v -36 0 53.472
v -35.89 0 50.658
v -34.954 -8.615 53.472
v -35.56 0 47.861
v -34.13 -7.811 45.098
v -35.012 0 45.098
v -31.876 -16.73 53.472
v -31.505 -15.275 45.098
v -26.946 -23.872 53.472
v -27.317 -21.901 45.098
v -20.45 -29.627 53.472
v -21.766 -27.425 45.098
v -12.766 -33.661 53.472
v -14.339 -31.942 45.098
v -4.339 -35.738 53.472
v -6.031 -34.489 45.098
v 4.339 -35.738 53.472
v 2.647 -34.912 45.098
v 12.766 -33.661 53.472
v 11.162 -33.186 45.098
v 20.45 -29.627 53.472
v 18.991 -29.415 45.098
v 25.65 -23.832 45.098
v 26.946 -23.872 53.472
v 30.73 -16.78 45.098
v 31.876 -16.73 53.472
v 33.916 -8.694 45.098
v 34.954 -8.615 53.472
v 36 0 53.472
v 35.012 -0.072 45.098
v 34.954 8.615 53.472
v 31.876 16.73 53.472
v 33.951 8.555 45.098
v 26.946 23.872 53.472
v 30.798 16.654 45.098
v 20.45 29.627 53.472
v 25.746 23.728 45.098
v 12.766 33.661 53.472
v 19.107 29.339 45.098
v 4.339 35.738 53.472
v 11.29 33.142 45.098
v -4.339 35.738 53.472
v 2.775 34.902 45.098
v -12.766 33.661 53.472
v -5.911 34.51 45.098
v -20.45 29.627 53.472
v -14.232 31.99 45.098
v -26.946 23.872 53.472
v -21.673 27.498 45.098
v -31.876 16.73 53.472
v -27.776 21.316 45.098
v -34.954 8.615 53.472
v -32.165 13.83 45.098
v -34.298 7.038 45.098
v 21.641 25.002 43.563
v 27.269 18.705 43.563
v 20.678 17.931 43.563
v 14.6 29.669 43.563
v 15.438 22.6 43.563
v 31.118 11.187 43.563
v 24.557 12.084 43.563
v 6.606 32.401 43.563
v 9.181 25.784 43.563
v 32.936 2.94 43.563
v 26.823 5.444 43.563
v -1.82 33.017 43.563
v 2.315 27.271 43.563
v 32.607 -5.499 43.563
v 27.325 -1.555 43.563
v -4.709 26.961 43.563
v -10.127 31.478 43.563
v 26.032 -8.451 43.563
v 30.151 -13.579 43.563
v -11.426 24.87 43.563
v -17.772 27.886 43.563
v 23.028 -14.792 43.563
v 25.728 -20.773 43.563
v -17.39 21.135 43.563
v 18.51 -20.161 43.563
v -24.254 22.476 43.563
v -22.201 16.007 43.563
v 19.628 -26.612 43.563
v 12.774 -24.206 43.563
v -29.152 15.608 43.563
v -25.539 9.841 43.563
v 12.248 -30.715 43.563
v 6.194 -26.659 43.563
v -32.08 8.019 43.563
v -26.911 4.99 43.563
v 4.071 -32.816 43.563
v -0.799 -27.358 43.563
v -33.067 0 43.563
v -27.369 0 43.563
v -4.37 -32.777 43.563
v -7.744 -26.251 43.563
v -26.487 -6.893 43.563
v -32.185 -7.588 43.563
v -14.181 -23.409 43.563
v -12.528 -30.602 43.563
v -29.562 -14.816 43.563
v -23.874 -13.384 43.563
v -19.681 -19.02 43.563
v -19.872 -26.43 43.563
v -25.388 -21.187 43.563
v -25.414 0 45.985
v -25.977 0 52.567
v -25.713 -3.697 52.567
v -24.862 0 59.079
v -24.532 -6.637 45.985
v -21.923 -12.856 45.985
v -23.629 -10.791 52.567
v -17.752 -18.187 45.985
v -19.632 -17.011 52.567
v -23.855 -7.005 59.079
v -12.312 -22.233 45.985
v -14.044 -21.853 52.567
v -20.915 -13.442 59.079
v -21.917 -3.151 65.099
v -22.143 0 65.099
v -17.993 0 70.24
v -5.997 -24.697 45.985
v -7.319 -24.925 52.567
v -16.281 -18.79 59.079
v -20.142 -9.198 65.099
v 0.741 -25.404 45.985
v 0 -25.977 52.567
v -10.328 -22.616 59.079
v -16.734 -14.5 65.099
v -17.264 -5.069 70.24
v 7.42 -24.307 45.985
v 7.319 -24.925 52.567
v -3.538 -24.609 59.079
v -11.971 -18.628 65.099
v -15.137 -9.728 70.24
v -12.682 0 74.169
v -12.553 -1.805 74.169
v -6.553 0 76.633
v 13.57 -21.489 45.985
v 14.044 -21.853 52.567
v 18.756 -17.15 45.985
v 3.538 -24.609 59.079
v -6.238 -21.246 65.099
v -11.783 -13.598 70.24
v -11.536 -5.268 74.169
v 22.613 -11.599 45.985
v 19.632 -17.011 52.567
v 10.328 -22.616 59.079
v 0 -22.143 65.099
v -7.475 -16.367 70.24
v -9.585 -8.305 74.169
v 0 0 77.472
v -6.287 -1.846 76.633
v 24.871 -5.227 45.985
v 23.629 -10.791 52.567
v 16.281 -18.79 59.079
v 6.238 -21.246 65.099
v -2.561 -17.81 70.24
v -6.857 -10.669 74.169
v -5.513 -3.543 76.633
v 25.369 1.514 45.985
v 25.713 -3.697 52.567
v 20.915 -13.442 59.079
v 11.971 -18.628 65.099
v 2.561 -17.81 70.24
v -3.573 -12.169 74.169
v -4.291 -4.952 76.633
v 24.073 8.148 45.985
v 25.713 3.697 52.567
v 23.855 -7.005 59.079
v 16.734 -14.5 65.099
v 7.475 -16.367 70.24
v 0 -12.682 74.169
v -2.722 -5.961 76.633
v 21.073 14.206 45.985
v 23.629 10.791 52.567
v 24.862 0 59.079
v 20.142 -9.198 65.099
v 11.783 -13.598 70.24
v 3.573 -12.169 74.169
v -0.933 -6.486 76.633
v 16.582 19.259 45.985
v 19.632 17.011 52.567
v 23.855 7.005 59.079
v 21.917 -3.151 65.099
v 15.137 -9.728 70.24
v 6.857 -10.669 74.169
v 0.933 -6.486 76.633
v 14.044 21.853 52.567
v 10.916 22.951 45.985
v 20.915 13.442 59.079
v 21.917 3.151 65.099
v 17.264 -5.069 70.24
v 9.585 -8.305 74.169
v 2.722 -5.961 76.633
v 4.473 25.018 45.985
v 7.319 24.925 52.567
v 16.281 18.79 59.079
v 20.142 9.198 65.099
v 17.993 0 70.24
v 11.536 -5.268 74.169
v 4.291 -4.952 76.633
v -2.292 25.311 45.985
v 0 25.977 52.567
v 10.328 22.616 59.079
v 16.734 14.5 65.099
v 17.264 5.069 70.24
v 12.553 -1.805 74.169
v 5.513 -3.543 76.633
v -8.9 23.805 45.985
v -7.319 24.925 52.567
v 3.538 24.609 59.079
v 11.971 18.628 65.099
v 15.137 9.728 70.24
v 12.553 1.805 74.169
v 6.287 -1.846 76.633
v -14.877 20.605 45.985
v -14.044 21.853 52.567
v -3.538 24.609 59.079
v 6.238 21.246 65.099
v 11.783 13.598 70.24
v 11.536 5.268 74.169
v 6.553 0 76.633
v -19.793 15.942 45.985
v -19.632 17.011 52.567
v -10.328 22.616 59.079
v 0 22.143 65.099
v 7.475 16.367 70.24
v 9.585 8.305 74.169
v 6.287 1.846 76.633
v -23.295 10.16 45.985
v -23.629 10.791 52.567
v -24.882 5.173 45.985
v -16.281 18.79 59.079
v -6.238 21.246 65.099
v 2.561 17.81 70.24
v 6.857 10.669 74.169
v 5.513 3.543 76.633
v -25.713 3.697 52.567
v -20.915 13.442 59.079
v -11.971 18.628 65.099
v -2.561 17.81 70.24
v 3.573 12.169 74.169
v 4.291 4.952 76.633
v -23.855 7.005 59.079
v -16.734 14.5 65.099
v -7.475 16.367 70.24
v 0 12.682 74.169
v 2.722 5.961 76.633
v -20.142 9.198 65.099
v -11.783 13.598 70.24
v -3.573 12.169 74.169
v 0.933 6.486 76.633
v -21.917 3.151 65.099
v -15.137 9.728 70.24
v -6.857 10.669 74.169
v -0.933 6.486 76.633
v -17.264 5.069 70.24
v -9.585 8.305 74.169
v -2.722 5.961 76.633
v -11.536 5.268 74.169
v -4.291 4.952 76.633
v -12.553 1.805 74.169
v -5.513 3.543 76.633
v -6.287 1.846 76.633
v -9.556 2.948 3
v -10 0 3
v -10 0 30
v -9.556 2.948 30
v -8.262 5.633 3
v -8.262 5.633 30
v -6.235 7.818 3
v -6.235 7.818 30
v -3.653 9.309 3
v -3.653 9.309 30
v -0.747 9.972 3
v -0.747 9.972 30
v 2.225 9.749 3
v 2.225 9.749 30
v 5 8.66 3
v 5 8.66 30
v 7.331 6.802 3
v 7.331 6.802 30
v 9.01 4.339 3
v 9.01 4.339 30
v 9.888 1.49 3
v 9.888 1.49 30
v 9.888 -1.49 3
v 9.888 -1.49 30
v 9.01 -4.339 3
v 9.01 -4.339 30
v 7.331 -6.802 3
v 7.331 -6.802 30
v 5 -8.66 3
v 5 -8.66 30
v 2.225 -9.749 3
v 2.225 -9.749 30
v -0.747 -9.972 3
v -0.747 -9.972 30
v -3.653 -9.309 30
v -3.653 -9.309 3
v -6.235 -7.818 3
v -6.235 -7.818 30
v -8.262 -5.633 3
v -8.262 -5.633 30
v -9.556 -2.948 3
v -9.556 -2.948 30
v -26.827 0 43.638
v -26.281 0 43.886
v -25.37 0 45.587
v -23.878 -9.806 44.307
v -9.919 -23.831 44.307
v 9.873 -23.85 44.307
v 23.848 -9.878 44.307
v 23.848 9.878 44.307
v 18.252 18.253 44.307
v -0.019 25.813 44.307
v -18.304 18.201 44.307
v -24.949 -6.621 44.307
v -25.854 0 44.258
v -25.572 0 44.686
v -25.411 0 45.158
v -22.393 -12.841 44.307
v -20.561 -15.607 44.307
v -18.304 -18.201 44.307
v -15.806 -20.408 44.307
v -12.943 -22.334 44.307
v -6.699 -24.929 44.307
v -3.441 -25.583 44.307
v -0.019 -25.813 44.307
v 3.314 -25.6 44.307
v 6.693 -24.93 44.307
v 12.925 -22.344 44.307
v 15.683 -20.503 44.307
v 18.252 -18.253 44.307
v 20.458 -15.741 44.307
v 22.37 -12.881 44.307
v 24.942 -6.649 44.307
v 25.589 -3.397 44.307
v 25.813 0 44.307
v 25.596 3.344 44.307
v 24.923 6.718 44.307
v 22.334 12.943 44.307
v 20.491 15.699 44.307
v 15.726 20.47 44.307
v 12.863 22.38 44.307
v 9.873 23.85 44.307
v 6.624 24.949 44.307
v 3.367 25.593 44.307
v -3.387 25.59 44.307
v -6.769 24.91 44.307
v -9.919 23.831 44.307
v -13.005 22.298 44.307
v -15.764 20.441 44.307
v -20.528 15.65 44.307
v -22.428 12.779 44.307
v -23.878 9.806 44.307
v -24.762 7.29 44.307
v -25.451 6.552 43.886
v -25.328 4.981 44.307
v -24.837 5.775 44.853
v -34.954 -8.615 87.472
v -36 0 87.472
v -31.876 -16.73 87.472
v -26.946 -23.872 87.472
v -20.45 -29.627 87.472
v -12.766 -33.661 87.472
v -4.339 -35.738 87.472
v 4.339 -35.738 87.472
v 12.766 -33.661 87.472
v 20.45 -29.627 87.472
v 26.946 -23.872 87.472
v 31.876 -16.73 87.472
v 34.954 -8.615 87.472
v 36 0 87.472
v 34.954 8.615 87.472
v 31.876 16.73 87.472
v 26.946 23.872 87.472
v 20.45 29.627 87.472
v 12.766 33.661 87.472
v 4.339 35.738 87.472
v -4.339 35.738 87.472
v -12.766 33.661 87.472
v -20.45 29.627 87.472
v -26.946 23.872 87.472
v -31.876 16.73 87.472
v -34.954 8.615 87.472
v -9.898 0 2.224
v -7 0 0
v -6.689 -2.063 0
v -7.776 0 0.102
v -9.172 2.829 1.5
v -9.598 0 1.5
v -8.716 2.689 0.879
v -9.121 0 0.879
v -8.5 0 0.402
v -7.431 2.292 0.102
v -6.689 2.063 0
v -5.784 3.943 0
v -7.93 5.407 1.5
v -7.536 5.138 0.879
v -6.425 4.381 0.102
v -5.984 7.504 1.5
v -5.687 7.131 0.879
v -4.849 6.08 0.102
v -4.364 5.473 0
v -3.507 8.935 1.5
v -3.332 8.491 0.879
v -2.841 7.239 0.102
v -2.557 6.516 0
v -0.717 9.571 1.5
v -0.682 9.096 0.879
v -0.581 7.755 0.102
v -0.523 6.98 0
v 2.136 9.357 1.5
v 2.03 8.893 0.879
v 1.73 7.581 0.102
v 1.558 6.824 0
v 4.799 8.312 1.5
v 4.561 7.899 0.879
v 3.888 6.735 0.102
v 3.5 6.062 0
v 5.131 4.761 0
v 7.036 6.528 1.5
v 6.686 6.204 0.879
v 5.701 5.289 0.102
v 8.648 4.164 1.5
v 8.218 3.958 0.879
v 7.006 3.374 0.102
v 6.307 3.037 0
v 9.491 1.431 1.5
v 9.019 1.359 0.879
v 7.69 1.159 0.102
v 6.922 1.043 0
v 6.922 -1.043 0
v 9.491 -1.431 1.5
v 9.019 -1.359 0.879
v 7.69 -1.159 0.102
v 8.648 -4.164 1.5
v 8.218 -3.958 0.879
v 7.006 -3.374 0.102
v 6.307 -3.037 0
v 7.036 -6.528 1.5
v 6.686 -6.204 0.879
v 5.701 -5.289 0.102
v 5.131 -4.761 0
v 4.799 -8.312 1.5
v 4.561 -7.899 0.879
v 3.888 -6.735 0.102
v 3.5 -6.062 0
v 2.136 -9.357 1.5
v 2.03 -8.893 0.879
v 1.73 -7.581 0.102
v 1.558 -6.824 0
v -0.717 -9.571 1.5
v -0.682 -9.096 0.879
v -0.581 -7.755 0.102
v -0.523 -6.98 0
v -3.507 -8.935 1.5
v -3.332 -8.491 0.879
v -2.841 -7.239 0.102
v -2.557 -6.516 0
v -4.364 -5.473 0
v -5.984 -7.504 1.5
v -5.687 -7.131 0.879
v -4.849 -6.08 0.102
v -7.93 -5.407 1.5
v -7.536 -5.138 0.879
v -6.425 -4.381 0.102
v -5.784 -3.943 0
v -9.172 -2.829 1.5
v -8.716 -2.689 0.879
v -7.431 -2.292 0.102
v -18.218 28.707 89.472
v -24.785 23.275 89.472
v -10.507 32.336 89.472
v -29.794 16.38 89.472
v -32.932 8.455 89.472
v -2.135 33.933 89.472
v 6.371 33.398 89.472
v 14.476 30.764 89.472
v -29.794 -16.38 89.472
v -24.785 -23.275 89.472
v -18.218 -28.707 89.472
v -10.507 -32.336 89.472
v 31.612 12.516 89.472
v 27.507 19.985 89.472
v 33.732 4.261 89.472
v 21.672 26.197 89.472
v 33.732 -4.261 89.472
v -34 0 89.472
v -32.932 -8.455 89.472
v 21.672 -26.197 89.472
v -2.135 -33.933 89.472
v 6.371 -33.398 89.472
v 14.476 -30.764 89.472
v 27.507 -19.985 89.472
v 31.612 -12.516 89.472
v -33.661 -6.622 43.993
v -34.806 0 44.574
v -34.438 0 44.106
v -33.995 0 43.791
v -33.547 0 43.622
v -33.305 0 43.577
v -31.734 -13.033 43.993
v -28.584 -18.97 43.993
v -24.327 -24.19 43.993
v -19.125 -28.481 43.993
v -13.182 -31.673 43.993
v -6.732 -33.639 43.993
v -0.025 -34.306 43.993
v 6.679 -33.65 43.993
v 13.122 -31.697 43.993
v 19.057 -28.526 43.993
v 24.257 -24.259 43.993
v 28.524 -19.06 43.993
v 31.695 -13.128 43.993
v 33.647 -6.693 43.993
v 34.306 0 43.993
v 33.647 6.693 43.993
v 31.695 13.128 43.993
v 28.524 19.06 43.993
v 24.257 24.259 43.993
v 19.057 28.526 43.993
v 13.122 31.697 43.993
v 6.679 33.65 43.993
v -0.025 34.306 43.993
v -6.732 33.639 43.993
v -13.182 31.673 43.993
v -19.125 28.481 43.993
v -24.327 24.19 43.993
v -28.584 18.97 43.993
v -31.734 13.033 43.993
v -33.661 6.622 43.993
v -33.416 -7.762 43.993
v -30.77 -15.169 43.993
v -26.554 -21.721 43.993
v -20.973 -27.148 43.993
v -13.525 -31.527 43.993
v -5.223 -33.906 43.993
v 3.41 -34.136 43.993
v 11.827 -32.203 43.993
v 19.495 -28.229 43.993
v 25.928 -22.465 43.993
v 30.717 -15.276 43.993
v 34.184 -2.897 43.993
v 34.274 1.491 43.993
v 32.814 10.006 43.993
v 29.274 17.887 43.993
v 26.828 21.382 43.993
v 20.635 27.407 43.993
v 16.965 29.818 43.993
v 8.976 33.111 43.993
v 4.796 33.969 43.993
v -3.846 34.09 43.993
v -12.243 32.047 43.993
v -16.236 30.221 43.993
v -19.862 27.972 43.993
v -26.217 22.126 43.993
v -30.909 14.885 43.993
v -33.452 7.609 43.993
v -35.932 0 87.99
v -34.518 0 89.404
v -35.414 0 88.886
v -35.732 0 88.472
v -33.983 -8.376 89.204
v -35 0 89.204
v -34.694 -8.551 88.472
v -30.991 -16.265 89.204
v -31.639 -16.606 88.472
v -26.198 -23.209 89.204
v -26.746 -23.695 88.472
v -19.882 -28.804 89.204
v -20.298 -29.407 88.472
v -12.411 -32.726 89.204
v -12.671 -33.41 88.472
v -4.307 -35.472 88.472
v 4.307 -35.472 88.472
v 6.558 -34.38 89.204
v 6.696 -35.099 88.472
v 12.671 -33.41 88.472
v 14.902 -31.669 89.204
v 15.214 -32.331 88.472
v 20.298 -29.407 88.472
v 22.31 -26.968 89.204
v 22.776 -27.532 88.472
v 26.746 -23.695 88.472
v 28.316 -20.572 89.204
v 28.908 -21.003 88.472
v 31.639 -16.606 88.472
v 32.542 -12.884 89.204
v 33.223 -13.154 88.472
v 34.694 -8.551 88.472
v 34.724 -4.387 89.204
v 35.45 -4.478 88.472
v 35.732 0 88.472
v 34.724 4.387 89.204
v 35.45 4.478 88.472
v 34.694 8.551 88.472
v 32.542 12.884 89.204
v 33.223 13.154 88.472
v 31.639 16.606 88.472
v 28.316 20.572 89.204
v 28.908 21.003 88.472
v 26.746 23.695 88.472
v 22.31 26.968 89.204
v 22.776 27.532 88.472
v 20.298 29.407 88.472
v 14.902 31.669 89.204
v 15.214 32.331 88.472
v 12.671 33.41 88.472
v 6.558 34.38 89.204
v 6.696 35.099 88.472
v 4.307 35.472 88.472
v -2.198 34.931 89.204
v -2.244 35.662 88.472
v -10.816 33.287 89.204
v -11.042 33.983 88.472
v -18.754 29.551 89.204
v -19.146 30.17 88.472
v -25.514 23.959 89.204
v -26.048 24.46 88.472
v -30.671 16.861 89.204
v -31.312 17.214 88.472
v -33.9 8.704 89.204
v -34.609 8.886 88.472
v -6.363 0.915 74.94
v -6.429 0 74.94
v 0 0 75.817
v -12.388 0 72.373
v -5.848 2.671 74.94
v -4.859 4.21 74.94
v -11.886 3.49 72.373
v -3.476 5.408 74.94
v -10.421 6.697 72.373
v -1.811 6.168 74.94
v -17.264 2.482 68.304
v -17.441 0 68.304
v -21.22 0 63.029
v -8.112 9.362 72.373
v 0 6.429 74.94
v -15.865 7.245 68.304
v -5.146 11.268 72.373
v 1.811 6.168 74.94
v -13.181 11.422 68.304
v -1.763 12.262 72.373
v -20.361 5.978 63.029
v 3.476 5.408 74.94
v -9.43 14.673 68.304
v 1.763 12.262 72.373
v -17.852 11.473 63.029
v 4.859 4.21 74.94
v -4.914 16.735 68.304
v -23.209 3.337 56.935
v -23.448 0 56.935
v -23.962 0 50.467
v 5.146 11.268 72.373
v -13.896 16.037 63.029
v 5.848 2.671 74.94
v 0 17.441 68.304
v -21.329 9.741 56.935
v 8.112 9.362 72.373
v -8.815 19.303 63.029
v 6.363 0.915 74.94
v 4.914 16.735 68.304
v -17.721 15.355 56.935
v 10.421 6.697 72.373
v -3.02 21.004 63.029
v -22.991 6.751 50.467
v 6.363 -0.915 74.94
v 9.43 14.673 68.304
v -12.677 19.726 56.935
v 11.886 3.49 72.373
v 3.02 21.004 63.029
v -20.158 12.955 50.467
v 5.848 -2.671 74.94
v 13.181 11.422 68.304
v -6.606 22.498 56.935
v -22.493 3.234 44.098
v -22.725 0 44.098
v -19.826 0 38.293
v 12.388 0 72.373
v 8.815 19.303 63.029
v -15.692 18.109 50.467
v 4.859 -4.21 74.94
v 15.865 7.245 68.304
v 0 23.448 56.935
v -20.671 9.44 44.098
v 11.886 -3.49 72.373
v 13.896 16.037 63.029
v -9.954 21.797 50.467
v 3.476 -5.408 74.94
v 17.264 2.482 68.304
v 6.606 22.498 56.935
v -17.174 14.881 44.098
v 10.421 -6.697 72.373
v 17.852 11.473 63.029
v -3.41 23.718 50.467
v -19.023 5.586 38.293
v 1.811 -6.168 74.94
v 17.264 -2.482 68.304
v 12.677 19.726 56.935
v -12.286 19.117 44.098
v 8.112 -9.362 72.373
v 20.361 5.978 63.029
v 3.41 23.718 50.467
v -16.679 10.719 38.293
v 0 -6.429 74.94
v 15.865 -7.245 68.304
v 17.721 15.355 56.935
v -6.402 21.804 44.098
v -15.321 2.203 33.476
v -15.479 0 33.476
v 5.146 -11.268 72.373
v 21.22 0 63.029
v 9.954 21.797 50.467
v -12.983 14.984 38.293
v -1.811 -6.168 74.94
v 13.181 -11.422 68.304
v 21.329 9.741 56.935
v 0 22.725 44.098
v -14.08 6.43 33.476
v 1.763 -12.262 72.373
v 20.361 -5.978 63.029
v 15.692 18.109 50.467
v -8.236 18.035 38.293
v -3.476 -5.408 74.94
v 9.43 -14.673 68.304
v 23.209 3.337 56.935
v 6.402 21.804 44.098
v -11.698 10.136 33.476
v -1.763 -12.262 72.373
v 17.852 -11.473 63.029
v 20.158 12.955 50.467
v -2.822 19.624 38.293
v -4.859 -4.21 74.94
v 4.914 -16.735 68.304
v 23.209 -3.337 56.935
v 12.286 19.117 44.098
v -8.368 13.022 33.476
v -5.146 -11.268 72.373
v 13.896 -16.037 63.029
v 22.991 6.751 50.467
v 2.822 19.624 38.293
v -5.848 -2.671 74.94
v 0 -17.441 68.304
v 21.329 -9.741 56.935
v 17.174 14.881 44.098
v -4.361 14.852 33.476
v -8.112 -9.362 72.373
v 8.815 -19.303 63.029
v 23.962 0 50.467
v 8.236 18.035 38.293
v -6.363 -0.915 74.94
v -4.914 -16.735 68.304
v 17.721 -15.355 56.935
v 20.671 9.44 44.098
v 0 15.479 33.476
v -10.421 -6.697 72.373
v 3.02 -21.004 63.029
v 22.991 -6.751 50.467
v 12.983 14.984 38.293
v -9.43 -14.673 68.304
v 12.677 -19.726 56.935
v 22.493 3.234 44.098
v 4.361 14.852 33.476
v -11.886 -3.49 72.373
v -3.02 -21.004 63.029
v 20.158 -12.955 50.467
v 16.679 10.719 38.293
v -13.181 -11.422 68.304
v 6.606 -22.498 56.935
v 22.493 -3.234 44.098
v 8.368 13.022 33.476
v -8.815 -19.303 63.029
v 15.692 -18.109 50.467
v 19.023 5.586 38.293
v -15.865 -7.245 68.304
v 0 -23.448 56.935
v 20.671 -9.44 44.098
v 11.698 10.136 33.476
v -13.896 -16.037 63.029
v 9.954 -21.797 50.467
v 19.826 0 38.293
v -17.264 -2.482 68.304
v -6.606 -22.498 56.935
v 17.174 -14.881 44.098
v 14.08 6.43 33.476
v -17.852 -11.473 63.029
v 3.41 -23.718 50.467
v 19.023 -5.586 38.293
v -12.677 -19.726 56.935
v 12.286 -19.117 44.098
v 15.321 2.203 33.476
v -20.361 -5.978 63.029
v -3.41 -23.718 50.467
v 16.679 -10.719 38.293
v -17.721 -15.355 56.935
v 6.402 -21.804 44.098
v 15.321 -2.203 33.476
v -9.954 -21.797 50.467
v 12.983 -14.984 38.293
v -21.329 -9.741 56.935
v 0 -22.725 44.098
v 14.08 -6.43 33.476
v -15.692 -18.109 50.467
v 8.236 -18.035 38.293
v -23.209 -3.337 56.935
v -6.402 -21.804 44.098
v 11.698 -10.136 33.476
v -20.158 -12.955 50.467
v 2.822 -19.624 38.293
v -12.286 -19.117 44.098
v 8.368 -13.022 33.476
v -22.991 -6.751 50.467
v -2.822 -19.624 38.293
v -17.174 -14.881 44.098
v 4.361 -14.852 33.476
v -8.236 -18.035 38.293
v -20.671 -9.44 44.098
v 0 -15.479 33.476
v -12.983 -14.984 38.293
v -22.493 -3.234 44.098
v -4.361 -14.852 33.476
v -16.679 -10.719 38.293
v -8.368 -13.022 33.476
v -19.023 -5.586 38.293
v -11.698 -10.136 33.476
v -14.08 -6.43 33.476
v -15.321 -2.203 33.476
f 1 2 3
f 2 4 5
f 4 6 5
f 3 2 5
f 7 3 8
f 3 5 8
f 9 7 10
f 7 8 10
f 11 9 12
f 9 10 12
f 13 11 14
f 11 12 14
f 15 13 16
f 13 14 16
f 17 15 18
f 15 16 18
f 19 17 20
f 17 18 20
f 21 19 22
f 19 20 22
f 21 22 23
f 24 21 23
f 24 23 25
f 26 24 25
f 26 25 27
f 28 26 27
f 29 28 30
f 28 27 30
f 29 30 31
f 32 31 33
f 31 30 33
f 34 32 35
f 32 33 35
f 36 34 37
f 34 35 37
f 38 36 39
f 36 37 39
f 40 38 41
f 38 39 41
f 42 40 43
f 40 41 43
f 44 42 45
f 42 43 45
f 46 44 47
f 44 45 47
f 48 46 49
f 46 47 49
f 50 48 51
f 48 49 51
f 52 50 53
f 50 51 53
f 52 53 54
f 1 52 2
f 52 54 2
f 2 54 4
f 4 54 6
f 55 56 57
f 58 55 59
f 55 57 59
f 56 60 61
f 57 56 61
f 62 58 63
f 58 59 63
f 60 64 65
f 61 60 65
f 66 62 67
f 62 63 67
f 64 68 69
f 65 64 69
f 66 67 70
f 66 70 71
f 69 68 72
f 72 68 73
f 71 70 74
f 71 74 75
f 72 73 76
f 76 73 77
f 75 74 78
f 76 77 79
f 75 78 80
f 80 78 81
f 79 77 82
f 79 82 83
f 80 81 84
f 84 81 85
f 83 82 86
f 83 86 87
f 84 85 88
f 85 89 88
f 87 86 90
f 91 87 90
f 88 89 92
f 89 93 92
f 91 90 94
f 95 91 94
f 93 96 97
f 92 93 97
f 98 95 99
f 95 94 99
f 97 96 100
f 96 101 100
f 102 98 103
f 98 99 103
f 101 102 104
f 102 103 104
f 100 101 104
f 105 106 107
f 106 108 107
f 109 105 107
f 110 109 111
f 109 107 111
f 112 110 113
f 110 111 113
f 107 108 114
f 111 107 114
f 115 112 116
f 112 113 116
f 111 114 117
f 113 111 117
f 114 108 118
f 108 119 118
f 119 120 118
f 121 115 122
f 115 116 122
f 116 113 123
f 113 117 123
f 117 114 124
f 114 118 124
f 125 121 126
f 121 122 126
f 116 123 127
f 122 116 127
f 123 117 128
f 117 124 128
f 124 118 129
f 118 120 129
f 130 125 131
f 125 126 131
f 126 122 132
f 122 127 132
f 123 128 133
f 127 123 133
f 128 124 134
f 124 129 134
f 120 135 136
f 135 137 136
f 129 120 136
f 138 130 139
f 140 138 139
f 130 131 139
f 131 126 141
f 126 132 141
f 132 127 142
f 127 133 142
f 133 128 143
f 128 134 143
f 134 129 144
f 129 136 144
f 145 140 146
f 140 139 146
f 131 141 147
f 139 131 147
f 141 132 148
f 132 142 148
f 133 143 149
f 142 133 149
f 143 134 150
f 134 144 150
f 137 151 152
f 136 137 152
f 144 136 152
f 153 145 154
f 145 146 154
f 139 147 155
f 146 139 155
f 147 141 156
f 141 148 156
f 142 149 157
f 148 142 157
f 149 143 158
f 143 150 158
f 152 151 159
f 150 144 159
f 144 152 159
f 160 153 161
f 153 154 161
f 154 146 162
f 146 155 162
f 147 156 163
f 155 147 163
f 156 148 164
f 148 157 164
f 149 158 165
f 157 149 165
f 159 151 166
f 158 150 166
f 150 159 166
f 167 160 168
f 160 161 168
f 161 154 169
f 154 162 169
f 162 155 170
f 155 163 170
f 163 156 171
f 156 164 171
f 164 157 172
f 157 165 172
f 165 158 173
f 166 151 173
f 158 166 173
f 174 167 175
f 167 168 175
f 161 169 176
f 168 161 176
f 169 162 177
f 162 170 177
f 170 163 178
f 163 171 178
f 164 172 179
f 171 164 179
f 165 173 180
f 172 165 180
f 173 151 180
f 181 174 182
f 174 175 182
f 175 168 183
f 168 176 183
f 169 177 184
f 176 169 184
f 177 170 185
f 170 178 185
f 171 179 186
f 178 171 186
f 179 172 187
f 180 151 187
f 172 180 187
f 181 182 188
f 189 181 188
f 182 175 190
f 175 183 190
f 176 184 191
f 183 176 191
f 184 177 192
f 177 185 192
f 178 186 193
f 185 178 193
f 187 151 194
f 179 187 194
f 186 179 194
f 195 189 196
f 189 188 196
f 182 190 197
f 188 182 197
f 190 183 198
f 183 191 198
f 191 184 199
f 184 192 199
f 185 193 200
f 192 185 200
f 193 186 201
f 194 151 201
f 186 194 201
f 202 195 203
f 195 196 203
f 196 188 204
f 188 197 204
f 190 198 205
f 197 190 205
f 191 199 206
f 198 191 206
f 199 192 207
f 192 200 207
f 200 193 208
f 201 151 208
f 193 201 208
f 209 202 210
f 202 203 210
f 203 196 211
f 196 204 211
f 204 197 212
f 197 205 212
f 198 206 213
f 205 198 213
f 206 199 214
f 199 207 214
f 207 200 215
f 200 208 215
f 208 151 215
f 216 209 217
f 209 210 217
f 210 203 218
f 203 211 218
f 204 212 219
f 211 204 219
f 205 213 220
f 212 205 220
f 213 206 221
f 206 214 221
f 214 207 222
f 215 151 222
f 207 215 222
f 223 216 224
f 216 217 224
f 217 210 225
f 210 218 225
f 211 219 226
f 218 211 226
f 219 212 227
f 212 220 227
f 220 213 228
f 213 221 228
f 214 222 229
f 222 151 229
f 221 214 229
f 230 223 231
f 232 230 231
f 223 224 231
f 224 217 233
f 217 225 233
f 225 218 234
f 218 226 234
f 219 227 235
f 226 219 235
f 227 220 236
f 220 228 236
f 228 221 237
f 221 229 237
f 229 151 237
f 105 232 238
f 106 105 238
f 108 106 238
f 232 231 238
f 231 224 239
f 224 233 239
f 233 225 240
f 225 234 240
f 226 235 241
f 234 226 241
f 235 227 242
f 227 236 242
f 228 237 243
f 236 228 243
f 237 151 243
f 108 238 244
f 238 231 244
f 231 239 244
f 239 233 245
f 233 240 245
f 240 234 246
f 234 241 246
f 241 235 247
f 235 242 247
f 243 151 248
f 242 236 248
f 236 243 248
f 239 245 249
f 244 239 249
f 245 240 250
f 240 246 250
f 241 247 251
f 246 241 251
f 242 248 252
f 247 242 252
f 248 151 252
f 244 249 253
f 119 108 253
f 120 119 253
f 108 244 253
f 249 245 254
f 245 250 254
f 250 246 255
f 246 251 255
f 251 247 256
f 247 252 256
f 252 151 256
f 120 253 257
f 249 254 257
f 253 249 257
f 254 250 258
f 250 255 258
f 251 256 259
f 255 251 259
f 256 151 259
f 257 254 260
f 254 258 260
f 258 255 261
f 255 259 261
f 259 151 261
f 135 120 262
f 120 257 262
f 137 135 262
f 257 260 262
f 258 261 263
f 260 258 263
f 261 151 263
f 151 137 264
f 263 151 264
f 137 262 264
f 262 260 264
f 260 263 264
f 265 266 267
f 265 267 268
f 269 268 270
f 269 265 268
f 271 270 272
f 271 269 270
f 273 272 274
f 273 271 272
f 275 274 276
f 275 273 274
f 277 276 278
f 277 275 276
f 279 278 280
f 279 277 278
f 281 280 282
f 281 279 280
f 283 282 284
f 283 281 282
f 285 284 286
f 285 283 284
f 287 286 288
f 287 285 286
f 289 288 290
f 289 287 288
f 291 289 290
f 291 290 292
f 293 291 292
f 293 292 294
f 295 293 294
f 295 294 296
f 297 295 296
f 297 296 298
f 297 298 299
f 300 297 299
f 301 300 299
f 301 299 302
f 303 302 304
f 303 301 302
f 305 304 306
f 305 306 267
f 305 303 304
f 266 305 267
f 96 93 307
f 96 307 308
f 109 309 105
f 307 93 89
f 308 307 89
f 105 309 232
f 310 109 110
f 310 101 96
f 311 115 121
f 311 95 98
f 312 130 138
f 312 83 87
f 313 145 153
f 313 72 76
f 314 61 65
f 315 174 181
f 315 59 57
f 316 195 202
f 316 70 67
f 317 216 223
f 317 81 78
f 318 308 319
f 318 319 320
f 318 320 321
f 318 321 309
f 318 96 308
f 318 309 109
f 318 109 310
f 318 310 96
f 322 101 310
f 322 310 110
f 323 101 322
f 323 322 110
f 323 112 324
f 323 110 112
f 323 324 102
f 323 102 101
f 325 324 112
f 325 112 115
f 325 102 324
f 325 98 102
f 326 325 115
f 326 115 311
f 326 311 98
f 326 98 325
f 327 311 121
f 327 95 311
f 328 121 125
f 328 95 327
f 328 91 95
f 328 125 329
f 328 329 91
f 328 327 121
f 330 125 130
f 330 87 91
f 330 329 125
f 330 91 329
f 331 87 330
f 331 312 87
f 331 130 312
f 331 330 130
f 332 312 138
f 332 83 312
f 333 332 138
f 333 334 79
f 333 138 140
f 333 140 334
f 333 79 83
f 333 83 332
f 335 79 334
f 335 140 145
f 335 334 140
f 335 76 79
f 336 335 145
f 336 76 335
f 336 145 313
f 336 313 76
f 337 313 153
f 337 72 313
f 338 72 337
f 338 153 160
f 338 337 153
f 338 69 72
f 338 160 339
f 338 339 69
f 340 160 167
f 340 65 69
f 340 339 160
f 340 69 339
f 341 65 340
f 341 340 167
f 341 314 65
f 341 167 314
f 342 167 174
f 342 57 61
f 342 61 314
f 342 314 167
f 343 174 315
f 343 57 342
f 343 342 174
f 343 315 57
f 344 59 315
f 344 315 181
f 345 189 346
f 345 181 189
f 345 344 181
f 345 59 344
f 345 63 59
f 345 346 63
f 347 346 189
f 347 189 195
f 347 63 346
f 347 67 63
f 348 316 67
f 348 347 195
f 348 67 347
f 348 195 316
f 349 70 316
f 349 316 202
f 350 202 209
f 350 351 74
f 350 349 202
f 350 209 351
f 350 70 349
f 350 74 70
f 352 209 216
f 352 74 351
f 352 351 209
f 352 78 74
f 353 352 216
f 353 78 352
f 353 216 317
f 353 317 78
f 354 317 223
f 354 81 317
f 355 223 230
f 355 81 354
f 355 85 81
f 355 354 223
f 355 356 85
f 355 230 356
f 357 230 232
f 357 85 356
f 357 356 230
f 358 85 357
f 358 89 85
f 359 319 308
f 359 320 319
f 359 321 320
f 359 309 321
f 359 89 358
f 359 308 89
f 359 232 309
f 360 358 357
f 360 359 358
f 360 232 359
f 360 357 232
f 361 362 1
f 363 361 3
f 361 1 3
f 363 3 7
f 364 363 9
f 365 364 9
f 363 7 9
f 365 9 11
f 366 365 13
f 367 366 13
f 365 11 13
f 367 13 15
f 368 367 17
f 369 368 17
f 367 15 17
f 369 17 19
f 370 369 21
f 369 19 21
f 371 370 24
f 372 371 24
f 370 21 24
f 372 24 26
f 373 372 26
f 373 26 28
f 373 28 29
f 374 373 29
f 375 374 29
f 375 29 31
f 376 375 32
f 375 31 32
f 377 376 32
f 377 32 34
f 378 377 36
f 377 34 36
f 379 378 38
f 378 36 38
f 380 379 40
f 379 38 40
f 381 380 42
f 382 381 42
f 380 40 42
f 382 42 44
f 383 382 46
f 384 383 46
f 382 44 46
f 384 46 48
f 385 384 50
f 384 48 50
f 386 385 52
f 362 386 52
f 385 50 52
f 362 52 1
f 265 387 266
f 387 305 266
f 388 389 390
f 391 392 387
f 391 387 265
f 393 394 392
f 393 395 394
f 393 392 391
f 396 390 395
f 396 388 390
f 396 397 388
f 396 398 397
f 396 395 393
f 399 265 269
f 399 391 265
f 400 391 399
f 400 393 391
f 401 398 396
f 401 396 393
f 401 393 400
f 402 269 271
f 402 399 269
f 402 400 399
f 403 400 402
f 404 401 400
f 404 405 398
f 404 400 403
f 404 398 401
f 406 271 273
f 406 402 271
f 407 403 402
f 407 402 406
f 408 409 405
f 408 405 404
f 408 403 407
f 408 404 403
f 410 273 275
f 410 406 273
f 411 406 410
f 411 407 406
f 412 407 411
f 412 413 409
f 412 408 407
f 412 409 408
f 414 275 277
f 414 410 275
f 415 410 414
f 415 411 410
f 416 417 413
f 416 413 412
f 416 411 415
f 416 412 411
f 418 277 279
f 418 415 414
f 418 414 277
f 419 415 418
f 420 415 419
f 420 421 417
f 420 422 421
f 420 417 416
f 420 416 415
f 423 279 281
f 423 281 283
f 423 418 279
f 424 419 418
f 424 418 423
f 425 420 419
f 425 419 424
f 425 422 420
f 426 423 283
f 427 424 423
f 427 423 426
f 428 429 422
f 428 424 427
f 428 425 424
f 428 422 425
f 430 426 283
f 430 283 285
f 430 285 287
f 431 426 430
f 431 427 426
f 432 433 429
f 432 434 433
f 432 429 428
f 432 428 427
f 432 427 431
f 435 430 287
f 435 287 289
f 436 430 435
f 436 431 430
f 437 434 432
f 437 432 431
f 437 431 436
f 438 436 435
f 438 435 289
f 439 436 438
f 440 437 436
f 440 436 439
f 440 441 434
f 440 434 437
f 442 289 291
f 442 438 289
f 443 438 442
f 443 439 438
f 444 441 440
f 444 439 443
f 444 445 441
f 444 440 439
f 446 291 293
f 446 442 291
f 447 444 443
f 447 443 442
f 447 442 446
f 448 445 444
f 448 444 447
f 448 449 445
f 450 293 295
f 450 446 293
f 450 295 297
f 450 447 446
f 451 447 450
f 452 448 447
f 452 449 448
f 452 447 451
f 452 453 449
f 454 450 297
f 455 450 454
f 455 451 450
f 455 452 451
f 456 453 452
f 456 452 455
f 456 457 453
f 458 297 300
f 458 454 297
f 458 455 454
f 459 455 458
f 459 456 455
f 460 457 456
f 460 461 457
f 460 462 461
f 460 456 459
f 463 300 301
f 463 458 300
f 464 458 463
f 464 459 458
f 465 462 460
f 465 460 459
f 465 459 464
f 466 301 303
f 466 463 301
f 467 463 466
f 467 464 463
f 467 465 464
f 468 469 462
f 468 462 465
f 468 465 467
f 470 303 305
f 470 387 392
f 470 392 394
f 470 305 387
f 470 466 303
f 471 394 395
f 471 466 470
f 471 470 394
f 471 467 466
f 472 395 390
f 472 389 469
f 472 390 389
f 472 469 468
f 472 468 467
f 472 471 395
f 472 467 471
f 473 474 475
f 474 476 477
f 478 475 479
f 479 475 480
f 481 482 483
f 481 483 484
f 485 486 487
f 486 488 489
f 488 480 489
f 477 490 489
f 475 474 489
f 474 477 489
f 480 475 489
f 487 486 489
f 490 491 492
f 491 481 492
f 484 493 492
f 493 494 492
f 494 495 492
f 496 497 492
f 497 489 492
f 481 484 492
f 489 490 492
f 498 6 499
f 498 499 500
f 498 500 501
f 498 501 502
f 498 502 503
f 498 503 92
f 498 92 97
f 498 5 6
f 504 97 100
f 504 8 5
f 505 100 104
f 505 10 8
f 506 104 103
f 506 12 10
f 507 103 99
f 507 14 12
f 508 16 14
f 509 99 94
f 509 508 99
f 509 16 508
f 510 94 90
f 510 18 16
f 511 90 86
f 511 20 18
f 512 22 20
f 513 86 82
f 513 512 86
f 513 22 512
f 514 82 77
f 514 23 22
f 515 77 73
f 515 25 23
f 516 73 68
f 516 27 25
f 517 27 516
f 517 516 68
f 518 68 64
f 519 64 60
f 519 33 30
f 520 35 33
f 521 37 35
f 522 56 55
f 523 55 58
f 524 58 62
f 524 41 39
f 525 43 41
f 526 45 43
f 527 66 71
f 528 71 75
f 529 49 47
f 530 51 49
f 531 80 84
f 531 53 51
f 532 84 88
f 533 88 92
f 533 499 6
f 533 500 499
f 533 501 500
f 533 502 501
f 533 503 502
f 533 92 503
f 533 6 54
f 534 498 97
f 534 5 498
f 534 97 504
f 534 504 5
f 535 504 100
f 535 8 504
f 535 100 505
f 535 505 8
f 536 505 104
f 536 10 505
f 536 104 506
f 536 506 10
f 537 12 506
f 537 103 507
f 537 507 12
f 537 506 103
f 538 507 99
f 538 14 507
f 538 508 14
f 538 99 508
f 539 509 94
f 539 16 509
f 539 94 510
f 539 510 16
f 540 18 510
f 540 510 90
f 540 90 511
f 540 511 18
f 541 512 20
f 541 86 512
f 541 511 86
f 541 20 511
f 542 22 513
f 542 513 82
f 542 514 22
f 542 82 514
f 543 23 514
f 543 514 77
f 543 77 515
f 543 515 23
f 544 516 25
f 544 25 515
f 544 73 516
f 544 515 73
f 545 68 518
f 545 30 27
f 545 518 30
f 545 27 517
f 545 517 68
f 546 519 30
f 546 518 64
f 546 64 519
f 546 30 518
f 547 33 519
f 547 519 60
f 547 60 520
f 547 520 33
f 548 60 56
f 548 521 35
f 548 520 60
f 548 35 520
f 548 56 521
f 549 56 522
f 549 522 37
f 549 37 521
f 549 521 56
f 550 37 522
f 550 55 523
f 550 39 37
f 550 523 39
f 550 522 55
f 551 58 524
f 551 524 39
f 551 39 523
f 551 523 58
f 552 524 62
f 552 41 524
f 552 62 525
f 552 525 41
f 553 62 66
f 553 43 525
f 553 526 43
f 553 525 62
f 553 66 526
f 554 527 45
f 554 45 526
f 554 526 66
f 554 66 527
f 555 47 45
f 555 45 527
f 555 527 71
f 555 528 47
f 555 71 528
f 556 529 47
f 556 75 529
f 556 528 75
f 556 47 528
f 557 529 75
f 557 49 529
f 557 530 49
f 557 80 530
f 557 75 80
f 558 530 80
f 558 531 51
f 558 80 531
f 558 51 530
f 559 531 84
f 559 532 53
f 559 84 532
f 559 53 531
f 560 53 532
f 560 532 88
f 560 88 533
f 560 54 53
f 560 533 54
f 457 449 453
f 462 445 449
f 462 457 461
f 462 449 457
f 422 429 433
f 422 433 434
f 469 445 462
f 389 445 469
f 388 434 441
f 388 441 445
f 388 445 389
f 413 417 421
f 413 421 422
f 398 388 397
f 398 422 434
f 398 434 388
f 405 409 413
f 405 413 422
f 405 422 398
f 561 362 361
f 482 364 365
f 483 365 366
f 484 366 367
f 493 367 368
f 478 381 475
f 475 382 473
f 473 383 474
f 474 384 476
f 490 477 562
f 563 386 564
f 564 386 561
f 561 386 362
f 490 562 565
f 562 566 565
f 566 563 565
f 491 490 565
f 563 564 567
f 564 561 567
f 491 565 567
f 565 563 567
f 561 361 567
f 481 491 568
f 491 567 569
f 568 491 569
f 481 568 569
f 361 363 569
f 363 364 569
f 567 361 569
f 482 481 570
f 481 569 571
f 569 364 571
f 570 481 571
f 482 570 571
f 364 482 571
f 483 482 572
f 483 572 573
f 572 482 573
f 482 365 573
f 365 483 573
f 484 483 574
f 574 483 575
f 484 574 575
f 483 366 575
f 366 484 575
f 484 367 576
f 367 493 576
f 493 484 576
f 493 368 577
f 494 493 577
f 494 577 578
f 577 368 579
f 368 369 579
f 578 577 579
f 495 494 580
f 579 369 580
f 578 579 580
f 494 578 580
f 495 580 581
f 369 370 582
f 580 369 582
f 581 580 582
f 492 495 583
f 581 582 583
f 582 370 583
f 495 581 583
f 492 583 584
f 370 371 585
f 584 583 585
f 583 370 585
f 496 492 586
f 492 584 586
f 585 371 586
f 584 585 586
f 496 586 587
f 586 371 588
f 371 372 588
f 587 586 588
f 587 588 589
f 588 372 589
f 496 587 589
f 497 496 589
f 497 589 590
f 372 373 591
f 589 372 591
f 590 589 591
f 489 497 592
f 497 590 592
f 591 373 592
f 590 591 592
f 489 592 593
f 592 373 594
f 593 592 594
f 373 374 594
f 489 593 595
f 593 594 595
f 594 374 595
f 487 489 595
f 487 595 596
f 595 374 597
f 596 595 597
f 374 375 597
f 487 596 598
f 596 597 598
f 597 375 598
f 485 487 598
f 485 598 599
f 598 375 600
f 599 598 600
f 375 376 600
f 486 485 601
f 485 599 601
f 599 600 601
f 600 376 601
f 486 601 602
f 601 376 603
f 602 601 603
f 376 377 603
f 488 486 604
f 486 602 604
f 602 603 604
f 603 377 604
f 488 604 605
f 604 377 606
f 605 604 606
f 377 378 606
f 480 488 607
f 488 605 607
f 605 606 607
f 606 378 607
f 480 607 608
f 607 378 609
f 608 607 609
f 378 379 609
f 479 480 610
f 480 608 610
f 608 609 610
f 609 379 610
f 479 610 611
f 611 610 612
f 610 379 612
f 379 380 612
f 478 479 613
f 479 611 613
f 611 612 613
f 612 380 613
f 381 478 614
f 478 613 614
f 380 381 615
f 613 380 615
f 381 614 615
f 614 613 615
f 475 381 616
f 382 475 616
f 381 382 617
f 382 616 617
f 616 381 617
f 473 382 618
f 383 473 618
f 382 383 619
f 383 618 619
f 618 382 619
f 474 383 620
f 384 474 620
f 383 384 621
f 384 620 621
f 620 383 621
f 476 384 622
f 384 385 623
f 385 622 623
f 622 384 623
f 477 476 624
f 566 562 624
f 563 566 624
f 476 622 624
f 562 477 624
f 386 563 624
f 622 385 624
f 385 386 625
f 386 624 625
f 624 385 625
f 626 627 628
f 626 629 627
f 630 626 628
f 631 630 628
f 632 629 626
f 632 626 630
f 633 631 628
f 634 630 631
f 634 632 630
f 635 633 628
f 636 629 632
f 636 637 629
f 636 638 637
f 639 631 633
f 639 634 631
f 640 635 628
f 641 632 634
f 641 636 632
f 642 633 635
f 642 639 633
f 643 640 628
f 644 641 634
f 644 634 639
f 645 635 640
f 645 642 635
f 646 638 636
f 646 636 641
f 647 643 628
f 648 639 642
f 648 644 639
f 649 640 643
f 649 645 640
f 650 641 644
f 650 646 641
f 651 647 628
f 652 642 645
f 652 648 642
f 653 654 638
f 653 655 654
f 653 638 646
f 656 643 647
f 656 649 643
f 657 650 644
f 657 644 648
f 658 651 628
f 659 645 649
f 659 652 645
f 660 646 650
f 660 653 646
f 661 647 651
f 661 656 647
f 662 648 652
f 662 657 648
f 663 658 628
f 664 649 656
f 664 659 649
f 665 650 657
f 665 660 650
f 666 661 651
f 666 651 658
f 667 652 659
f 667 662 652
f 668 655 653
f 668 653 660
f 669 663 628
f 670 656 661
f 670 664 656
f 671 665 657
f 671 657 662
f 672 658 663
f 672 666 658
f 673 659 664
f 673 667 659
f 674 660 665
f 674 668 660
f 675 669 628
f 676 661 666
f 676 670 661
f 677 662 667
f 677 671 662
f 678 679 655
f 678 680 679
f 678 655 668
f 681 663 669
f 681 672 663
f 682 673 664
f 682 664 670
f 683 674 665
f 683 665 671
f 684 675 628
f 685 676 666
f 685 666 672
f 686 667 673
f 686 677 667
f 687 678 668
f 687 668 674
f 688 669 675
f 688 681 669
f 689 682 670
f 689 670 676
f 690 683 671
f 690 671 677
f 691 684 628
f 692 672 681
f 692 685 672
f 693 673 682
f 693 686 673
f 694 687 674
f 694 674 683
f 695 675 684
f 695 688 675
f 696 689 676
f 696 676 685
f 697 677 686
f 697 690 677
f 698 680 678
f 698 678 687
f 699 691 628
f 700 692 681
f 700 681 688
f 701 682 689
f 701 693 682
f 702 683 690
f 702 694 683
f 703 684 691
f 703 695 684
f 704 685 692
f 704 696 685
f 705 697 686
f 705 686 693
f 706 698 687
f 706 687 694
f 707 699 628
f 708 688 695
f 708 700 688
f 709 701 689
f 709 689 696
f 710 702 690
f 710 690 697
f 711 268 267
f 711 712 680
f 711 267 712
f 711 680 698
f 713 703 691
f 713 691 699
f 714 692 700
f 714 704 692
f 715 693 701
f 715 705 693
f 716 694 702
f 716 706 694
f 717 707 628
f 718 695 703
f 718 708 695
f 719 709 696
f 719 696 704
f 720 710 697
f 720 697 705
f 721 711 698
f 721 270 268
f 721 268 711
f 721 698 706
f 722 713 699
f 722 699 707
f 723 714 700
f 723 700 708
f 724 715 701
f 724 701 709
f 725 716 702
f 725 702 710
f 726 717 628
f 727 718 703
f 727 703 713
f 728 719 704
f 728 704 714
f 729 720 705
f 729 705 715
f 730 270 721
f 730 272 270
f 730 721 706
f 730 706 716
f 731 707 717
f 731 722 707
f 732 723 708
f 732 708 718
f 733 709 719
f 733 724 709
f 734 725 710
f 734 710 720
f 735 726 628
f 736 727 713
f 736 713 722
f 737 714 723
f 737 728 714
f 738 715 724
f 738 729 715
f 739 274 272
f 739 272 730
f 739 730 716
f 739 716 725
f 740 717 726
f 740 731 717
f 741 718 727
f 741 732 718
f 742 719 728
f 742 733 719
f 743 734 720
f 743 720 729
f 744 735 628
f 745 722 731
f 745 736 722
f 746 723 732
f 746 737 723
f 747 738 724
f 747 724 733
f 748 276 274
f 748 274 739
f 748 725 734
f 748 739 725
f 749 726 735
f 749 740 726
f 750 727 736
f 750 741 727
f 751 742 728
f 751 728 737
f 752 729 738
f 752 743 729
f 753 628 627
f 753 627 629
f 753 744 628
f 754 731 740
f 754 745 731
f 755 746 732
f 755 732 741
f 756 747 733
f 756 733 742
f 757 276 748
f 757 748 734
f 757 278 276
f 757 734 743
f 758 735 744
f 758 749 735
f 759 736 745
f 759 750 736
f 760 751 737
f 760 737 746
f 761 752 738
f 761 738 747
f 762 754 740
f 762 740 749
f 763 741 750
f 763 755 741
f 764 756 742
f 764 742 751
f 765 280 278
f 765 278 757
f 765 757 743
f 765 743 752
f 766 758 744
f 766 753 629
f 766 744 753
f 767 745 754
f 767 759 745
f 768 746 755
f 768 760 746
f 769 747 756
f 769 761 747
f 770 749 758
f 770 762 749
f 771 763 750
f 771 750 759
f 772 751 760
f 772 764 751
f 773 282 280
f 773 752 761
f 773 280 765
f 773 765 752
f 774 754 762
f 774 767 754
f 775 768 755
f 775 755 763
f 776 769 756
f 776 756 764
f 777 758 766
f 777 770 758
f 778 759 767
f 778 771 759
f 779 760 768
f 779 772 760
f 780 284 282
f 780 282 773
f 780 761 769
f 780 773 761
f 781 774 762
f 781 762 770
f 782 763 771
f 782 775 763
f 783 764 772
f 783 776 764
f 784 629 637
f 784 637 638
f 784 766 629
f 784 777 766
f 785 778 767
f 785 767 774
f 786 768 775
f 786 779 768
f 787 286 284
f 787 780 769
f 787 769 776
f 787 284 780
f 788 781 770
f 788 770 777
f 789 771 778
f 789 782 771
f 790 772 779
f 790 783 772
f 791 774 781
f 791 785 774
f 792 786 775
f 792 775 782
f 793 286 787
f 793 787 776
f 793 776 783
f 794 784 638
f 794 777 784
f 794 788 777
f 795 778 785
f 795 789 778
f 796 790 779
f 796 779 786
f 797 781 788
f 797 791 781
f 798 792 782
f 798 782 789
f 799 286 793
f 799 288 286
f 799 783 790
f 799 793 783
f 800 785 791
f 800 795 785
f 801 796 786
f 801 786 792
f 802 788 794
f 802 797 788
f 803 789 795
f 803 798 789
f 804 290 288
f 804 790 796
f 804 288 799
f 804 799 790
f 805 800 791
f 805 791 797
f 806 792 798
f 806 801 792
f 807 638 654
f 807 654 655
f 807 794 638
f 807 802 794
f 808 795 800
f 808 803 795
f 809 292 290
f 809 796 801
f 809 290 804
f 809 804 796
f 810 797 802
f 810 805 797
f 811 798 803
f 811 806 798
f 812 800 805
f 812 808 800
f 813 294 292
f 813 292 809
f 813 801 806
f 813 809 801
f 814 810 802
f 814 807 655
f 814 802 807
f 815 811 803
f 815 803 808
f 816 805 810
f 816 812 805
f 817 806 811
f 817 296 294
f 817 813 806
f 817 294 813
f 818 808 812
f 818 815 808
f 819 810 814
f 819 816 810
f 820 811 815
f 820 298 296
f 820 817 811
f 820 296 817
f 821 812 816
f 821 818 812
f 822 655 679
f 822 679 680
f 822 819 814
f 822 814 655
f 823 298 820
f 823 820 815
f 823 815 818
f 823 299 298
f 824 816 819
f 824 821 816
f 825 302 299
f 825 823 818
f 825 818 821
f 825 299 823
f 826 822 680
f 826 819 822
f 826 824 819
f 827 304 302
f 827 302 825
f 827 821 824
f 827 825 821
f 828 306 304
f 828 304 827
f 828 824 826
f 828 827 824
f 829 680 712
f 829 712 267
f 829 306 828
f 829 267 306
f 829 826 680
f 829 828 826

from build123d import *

# Parameters (mm, degrees)
F2_R = 3
F5_R = 2
F6_R = 2


with BuildPart() as f1:
    # F0 (on Front) → F1 (revolve)
    with BuildSketch(Plane.XZ):
        with BuildLine():
            Line((-10, 30), (-10, 0))
            Line((-10, 0), (0, 0))
            Line((0, 0), (0, 75.8174242293))
            ThreePointArc((0, 75.8174242293), (-23.448008247, 56.9351296964), (-10, 30))
        make_face()
    revolve(axis=Axis((0, 0, 37.9087121146), (0, 0, -1)))

    # F2
    f2_edges = [f1.edges().sort_by_distance(p)[0] for p in [
        (10, 0, 0),
    ]]
    fillet(f2_edges, radius=F2_R)


with BuildPart() as f4:
    # F3 (on Front) → F4 (revolve)
    with BuildSketch(Plane.XZ):
        with BuildLine():
            ThreePointArc((-24.7679079538, 43.5631129518), (-20.9956121583, 66.8077340189), (0, 77.472015252))
            Line((0, 77.472015252), (0, 89.472015252))
            Line((0, 89.472015252), (-36, 89.472015252))
            Line((-36, 89.472015252), (-36, 53.472015252))
            ThreePointArc((-36, 53.472015252), (-35.6506662311, 48.4690164231), (-34.6094445954, 43.5631129518))
            Line((-34.6094445954, 43.5631129518), (-26.9140184811, 43.5631129518))
            Line((-26.9140184811, 43.5631129518), (-24.7679079538, 43.5631129518))
        make_face()
    revolve(axis=Axis((0, 0, 59.5175641019), (0, 0, 1)))

    # F5
    f5_edges = [f4.edges().sort_by_distance(p)[0] for p in [
        (36, 0, 53.472015),
        (34.609445, 0, 43.563113),
        (-35.650666, 0, 48.469016),
        (36, 0, 89.472015),
    ]]
    fillet(f5_edges, radius=F5_R)

    # F6
    f6_edges = [f4.edges().sort_by_distance(p)[0] for p in [
        (24.767908, 0, 43.563113),
    ]]
    fillet(f6_edges, radius=F6_R)


solid = Compound([f1.part, f4.part])
